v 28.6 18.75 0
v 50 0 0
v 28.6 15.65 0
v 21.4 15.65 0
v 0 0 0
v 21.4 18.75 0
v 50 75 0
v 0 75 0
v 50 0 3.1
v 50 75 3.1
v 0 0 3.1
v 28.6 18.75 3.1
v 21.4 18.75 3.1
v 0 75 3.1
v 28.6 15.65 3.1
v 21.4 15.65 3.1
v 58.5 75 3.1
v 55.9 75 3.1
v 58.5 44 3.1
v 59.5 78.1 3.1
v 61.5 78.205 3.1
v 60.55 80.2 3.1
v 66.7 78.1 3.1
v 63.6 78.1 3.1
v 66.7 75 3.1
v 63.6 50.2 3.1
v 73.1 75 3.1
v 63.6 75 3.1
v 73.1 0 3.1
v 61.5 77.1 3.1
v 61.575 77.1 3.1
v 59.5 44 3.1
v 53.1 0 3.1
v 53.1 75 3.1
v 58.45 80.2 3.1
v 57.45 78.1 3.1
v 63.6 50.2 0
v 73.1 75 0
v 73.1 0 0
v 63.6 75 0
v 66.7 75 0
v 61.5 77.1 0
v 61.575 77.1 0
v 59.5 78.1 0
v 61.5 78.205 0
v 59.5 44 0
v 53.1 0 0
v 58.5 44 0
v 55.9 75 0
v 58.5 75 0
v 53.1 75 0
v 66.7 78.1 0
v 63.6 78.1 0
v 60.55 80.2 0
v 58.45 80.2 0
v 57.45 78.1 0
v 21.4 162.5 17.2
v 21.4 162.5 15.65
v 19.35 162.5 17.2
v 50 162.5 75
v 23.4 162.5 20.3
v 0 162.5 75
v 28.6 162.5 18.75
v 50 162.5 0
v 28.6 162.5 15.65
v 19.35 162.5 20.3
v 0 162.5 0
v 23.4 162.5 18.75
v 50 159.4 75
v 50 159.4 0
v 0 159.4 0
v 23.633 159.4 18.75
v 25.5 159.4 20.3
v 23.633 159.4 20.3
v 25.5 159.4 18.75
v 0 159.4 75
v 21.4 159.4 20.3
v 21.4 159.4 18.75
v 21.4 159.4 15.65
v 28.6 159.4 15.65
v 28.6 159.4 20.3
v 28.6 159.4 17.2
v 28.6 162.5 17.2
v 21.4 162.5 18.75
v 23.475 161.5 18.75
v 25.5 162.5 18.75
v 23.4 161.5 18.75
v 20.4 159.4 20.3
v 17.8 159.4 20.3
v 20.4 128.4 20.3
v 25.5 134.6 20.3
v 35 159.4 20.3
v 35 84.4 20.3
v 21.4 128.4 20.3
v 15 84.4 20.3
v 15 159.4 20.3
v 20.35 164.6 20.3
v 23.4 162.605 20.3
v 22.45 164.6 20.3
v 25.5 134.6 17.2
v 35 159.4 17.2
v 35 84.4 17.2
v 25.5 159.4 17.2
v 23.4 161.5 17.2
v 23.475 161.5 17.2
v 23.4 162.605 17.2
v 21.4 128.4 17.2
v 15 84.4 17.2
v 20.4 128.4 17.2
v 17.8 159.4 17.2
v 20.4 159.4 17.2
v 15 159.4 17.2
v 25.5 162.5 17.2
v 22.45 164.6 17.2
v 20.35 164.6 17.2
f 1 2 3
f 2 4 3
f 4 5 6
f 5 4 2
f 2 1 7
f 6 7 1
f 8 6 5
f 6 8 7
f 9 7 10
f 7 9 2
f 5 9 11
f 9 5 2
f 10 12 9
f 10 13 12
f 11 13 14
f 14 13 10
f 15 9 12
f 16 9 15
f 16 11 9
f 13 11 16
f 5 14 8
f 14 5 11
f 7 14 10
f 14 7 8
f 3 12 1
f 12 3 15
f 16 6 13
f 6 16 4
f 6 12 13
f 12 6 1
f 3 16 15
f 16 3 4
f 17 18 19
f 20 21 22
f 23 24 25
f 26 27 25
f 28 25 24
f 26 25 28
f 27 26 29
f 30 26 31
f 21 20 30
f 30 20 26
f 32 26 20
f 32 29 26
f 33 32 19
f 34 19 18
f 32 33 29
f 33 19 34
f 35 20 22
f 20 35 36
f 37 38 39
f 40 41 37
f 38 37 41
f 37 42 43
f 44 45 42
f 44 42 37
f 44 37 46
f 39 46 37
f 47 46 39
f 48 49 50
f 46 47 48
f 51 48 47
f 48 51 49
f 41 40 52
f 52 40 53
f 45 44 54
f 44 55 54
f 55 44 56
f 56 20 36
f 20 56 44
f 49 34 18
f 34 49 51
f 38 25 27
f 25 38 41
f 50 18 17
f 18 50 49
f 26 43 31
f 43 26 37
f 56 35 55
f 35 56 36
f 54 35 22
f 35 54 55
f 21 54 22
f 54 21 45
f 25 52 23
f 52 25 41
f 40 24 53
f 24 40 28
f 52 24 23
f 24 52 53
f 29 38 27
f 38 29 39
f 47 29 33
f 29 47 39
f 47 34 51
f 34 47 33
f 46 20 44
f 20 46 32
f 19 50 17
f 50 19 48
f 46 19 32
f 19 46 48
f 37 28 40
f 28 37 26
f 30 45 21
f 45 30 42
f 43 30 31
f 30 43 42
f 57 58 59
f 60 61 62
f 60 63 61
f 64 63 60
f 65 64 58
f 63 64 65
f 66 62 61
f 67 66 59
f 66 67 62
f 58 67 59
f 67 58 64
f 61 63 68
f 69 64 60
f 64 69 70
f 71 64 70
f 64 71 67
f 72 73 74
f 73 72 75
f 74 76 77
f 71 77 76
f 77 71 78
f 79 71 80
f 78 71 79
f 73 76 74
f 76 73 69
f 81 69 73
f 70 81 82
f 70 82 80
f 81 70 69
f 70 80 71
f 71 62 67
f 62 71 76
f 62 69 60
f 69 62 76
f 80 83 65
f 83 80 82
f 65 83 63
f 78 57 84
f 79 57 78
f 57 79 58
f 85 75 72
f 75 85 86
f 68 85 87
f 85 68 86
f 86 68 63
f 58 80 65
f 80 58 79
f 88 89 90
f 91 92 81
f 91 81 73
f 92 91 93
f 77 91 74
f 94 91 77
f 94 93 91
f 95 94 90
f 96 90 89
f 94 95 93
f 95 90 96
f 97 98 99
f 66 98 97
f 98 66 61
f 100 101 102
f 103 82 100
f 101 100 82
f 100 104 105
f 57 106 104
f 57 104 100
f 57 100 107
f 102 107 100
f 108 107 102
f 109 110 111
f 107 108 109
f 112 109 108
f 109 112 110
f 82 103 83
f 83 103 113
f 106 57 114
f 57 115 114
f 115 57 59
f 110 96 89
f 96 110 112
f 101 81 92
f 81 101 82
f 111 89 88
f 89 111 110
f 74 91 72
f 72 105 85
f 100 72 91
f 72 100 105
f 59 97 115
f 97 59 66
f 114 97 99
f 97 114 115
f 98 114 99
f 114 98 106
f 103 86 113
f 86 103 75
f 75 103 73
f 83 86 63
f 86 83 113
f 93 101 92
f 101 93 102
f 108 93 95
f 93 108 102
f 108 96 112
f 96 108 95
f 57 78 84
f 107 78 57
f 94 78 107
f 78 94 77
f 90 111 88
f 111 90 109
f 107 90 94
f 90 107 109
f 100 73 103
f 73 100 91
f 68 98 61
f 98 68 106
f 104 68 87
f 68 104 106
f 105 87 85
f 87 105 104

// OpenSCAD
include <../lasercut.scad>; 

// Loosley based upon http://www.deferredprocrastination.co.uk/blog/2013/so-whats-a-practical-laser-cut-clip-size/

$fn=60;
thickness = 3.1;
x = 50;
y = 75;
x_beam = 20;

module beam()
{
    lasercutoutSquare(thickness=thickness, x=x_beam, y=y,
        clips=[
            [UP,x_beam/2,y]
            ]
    );
}

module crossBeam()
{
    rotate([90,0,0]) 
    lasercutoutSquare(thickness=thickness, x=x, y=y,
        clip_holes=[
            [UP, x/2, y/4, x_beam]
            ]
    );
}


rotate([-90,0,0])  crossBeam();
translate([x+thickness,0,0]) beam();

translate([0,y*3/2+50,0]) crossBeam();
translate([(x-x_beam)/2,y/2+50-thickness,y*1/4-thickness/2]) rotate([0,0,0]) beam();
